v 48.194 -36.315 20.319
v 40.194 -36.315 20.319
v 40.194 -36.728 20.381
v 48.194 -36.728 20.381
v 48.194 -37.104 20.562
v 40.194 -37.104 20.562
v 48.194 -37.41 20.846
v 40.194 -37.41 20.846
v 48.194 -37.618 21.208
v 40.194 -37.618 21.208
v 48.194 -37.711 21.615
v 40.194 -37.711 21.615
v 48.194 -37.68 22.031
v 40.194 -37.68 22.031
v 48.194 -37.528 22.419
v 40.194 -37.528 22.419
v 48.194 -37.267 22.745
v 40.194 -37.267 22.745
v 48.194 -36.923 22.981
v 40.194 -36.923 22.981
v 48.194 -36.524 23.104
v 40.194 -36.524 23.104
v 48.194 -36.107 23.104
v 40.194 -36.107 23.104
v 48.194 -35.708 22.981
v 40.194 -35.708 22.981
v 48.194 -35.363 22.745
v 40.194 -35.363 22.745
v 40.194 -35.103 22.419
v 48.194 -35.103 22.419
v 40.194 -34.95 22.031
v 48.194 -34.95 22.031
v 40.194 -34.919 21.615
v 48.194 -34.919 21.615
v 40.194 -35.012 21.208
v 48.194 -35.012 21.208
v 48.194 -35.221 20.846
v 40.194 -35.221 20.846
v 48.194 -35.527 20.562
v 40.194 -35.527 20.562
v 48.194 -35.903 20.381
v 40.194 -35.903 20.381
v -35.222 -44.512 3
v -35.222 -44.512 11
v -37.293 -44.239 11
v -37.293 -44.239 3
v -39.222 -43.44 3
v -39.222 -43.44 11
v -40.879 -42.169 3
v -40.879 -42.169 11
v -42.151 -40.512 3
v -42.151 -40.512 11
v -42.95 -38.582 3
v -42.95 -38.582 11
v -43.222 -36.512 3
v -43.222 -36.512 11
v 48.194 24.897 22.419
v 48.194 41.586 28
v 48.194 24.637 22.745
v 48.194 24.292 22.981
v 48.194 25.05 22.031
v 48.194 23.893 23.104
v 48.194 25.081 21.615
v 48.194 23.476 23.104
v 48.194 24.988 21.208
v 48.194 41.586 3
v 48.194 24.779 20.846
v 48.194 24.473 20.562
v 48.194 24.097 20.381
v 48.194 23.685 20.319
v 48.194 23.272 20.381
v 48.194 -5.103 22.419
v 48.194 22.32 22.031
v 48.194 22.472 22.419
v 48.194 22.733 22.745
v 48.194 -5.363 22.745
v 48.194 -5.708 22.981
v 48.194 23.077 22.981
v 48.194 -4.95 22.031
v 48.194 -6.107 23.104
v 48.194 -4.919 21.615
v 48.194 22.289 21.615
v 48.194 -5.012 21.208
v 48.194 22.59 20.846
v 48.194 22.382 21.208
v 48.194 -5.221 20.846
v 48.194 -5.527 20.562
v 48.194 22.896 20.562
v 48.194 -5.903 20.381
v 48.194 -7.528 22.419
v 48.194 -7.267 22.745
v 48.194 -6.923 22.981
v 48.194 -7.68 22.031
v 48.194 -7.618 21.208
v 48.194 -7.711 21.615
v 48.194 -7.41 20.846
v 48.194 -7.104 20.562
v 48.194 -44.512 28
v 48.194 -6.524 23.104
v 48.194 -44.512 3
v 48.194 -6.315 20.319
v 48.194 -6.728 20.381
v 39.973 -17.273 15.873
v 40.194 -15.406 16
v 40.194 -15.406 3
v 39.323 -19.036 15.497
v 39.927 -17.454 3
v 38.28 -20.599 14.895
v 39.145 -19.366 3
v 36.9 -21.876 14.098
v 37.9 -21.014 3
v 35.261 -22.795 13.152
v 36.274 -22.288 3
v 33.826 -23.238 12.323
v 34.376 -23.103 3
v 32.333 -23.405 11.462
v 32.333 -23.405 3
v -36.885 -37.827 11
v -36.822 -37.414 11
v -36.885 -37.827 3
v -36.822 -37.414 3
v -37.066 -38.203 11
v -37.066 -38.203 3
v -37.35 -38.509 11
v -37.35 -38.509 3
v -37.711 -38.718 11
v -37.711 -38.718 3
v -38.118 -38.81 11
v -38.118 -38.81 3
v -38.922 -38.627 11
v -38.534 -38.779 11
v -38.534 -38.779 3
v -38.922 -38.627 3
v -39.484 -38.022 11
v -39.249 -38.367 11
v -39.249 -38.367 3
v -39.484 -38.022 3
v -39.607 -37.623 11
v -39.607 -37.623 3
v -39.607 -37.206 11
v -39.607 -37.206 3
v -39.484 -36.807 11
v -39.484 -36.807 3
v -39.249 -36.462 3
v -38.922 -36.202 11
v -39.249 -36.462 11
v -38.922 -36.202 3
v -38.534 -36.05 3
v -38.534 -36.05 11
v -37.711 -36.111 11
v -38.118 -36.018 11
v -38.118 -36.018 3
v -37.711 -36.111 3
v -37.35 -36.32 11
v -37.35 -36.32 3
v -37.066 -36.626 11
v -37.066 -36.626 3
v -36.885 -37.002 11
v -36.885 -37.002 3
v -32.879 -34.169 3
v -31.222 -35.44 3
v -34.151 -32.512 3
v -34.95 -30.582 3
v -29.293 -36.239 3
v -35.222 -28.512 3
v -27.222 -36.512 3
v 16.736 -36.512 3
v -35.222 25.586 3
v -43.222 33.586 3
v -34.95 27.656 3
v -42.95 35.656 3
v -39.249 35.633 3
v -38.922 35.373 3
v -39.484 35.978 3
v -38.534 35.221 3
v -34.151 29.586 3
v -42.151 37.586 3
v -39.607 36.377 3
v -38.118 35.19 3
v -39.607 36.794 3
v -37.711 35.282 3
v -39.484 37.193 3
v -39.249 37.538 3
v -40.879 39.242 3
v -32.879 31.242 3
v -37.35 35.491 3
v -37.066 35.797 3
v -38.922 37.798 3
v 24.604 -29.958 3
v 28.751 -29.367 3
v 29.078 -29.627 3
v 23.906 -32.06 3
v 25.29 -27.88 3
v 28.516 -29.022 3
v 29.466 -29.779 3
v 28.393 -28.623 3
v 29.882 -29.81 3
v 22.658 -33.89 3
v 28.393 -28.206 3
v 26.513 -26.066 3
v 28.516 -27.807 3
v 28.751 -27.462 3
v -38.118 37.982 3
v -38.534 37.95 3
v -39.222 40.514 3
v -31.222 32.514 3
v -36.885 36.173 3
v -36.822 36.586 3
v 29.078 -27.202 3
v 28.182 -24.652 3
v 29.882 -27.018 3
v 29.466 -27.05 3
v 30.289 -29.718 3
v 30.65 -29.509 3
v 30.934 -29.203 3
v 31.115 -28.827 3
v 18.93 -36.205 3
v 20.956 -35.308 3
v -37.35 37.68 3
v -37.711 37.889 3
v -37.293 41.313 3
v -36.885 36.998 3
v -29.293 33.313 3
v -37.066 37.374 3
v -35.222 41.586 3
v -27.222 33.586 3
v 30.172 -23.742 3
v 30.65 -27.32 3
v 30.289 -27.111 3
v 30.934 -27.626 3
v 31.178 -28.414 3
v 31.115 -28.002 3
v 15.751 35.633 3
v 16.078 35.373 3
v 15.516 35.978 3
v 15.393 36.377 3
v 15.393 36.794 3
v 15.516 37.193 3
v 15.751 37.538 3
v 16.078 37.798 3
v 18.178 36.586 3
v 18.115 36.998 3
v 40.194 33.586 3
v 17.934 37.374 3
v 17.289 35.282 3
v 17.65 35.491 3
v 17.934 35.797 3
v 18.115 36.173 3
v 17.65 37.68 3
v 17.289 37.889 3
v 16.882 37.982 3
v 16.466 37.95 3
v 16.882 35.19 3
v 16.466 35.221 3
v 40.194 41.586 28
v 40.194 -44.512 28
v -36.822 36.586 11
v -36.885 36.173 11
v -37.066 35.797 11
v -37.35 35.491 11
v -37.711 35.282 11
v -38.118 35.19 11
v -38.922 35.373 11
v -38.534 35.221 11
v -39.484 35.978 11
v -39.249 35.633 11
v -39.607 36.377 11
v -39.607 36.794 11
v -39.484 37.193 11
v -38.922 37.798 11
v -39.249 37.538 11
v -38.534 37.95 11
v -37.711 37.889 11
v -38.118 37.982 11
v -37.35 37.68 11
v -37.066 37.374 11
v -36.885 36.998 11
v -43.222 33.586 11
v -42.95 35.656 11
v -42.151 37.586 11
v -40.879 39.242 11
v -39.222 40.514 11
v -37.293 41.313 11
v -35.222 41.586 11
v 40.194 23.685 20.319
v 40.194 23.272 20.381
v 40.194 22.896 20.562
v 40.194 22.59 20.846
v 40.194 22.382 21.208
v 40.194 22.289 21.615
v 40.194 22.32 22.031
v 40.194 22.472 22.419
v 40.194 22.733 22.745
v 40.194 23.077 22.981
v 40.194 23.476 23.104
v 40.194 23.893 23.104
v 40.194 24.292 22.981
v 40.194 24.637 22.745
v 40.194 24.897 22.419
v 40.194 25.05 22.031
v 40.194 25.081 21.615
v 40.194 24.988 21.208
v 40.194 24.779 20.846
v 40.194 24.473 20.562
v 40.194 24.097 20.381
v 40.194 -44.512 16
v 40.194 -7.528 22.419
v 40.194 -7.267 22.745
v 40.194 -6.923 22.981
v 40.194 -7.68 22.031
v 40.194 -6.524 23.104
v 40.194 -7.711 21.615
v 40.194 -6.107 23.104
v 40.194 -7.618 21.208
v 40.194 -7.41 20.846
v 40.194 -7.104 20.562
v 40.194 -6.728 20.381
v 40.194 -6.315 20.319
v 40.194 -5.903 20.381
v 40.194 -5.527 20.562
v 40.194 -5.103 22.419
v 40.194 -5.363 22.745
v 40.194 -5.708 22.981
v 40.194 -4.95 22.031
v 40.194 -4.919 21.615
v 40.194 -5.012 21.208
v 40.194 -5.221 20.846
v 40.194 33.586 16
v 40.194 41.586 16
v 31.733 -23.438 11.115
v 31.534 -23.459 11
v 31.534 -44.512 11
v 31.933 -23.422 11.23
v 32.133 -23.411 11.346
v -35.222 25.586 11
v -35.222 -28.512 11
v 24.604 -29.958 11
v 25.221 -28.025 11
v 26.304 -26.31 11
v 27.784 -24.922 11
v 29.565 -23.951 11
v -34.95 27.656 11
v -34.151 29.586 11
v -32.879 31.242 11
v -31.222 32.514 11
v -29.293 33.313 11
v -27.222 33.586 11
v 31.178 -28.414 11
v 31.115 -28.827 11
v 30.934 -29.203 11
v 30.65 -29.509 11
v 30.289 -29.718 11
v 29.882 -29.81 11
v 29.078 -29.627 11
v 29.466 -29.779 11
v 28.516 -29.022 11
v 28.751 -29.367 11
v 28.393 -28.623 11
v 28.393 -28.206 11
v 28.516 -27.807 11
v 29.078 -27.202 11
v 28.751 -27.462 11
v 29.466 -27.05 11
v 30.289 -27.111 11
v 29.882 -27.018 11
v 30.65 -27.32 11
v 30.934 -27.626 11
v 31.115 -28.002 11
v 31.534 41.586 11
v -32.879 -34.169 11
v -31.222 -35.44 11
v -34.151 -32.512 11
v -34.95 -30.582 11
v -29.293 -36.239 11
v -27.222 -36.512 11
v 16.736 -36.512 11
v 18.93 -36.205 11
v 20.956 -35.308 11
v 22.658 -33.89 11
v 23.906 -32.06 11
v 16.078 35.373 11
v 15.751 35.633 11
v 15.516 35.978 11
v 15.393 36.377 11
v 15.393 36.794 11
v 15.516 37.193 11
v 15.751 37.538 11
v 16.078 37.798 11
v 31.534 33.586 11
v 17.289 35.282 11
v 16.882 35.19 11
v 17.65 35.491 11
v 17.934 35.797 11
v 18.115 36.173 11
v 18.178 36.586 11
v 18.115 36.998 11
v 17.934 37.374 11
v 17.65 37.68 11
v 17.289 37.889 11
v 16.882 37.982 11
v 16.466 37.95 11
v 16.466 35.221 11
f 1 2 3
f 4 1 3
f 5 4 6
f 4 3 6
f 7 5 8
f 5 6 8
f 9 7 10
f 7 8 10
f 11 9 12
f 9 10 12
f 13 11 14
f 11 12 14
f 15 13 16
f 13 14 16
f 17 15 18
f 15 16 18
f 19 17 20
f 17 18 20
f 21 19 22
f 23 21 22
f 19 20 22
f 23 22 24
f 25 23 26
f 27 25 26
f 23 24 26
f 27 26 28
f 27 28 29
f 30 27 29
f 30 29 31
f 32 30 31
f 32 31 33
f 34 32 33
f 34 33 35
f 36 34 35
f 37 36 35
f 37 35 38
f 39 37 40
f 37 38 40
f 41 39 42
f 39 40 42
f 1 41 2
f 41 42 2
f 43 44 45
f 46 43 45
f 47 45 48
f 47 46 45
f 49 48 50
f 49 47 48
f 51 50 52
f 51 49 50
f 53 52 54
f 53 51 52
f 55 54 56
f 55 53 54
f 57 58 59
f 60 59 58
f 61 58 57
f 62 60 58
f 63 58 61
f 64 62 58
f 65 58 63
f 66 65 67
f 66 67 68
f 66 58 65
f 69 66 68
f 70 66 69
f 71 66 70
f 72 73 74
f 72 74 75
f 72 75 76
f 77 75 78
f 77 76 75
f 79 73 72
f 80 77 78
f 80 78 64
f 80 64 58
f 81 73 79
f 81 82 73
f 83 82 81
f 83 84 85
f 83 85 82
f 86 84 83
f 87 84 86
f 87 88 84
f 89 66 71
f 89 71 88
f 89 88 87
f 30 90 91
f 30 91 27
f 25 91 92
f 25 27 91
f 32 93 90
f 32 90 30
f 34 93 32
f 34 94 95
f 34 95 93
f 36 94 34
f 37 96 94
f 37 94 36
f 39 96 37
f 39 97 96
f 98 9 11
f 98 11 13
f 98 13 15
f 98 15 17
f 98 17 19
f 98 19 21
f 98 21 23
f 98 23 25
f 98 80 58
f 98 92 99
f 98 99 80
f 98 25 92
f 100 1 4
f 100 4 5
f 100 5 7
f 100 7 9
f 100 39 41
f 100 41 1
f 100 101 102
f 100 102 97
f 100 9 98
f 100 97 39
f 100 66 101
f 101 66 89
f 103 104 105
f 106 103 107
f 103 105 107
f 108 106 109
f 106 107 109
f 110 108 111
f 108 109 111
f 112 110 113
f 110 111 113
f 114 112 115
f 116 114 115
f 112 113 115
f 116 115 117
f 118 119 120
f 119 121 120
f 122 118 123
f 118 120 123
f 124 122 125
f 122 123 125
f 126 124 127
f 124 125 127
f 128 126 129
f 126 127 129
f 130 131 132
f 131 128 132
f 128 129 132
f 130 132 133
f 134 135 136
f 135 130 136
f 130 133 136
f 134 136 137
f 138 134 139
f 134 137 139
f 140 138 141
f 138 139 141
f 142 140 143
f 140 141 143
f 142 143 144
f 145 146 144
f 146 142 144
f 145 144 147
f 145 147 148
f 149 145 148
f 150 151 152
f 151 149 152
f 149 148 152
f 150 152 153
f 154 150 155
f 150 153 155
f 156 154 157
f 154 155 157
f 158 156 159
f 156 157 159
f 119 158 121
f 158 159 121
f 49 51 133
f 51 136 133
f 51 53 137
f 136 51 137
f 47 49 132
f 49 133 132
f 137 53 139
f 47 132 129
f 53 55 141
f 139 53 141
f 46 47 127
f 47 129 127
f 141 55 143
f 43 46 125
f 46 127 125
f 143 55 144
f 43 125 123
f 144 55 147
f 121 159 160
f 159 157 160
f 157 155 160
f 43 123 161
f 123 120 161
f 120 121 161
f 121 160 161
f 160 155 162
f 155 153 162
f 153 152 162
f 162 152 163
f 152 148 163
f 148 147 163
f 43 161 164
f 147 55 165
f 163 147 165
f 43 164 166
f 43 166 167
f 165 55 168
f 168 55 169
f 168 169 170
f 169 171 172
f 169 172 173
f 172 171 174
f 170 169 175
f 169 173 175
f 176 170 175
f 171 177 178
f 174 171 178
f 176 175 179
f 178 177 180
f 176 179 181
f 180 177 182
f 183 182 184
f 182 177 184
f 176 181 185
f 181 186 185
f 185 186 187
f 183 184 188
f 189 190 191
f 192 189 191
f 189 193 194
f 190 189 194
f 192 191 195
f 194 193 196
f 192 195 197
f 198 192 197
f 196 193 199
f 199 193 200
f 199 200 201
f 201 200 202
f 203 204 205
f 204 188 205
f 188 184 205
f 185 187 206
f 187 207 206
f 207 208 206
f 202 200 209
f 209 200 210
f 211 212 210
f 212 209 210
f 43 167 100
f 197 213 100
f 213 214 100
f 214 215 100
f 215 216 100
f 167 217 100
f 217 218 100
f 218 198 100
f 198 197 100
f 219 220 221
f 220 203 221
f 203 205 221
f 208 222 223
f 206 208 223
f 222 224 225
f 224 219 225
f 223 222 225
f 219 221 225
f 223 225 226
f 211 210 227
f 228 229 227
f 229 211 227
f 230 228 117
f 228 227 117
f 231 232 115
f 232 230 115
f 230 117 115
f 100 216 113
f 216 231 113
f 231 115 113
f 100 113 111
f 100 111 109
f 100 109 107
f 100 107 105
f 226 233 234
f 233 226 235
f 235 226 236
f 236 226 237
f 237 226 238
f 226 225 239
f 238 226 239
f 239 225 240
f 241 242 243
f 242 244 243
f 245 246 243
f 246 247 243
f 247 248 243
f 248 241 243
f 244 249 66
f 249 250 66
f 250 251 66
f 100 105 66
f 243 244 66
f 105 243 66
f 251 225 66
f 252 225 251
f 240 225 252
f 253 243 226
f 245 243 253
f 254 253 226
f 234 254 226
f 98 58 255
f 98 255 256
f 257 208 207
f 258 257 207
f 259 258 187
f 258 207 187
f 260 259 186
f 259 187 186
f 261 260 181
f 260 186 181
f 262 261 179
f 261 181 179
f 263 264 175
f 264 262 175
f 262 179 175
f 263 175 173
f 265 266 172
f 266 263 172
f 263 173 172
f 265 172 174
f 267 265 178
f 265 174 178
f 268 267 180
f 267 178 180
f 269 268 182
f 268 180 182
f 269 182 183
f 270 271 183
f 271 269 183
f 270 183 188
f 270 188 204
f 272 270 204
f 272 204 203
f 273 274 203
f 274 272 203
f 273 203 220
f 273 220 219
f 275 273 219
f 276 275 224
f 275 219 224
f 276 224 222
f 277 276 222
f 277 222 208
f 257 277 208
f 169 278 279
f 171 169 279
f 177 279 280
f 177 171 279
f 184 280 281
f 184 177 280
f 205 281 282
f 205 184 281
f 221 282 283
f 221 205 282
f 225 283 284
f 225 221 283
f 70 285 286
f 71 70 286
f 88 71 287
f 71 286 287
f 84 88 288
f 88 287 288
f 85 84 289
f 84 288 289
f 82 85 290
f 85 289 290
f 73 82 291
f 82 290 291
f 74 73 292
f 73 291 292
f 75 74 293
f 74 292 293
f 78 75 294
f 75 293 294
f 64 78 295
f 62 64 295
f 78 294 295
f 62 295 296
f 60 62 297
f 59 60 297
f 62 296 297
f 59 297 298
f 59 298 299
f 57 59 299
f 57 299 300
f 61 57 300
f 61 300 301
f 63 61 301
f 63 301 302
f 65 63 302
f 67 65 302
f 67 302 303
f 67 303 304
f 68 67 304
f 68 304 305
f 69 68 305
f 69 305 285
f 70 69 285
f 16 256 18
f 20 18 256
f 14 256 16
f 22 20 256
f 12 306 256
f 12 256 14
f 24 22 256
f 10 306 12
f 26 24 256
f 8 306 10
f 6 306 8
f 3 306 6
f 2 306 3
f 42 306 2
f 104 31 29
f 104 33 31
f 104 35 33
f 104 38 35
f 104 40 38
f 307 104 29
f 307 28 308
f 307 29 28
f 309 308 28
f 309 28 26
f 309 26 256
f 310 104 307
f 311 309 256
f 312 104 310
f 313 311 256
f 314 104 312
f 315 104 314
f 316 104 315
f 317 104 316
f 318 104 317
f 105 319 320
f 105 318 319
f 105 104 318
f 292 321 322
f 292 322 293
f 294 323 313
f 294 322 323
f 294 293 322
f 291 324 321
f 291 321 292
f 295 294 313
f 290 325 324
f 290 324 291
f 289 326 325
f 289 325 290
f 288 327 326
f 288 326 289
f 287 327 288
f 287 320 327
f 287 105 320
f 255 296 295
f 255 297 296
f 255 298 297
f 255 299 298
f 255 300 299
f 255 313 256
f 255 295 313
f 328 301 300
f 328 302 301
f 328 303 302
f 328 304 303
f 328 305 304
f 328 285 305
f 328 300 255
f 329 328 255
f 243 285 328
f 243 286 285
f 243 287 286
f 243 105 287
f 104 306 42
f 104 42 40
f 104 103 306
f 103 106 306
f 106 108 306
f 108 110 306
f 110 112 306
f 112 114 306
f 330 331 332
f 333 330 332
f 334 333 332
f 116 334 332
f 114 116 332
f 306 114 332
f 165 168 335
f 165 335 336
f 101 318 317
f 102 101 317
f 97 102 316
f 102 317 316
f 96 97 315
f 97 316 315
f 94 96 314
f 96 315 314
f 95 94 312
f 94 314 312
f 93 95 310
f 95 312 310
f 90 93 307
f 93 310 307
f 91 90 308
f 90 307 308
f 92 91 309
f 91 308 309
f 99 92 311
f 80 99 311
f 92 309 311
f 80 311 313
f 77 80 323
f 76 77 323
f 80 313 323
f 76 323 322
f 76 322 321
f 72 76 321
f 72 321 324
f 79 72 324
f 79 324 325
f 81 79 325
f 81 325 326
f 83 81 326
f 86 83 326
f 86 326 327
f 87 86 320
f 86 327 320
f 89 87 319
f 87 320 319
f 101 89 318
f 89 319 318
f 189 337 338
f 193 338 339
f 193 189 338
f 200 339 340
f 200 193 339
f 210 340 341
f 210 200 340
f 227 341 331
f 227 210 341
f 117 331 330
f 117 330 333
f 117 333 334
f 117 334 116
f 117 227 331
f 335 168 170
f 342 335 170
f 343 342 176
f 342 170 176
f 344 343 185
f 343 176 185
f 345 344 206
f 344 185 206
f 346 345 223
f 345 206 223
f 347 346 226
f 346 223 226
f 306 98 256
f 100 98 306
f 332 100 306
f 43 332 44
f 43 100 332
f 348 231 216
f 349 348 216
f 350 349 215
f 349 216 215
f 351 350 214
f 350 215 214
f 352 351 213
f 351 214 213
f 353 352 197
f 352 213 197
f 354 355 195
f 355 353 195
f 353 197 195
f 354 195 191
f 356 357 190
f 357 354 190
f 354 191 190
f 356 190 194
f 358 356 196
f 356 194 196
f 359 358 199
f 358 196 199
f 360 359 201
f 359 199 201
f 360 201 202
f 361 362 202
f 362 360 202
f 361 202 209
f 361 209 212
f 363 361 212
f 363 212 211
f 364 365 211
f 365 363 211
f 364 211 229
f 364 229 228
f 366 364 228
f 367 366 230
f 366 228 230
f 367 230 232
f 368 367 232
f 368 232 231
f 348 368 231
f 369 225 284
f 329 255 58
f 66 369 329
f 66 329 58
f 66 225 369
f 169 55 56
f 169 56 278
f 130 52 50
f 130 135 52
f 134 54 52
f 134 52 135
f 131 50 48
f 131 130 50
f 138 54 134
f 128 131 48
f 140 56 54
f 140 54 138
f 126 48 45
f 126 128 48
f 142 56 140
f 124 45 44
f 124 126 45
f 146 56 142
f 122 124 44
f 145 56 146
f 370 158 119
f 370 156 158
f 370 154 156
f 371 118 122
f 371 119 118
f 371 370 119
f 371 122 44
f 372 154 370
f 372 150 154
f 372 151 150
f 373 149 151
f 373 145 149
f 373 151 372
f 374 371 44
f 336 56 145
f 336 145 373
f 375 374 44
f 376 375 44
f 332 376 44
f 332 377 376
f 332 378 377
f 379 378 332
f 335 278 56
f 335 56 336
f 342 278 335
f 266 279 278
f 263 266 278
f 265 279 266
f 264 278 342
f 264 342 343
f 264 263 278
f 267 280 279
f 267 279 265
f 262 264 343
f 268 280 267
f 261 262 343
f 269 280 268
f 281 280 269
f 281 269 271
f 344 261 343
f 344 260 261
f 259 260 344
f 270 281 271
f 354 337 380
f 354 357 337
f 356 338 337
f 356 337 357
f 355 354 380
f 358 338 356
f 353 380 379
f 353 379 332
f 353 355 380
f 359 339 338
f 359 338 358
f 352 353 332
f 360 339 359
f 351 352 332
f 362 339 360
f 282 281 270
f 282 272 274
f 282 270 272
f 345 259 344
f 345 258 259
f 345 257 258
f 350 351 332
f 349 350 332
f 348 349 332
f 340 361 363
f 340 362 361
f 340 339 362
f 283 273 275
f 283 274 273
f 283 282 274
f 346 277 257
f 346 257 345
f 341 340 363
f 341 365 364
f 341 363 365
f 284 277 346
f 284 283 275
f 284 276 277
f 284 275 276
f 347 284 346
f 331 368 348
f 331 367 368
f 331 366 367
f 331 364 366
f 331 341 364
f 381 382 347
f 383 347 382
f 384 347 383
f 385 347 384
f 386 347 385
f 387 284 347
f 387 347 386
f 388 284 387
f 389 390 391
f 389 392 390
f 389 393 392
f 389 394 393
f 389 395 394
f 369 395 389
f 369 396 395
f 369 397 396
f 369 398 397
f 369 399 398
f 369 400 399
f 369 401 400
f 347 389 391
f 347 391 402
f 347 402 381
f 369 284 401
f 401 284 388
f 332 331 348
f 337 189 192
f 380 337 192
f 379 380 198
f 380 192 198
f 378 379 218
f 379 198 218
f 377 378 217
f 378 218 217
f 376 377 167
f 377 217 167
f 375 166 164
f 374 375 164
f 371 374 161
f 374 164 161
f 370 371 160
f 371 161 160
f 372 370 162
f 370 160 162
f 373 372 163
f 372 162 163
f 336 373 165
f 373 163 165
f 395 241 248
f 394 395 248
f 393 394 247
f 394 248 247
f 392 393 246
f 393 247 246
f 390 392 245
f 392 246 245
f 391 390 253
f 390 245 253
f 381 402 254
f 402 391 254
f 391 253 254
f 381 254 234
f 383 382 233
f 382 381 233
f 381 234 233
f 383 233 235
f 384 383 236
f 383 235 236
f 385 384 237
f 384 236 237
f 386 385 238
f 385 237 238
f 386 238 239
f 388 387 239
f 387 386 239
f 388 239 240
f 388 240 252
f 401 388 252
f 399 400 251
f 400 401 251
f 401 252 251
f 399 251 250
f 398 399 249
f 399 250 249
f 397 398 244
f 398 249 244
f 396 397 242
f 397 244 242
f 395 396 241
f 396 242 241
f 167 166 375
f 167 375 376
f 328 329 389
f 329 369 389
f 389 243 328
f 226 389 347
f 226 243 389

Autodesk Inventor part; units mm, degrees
ref_plane "YZ Plane" through (0, 0, 0) normal (1, 0, 0) x (0, 1, 0)
ref_plane "XZ Plane" through (0, 0, 0) normal (0, 1, 0) x (-1, 0, 0)
ref_plane "XY Plane" through (0, 0, 0) normal (0, 0, 1) x (1, 0, 0)
ref_plane "Arbeitsebene1" through (0, 0, 3) normal (0, 0, 1) x (1, 0, 0)
sketch "Skizze1" plane through (0, 0, 3) normal (0, 0, 1) x (1, 0, 0)
  line L0 (43.1941, -41.5994) -> (-43.1659, -41.5994) construction
  line L1 (43.1941, 41.5856) -> (43.1941, -41.5994) construction
  line L2 (-43.2224, 41.5856) -> (43.1941, 41.5856) construction
  line L3 (-43.1659, -41.5994) -> (-43.2224, 41.5856) construction
  circle A0 centre (37.6276, -35.8844) radius 0.5 construction
  circle A1 centre (35.0876, -35.8844) radius 0.5 construction
  circle A2 centre (32.5476, -35.8844) radius 0.5 construction
  circle A3 centre (36.8476, -29.7044) radius 0.5 construction
  circle A4 centre (25.8376, -35.8644) radius 0.5 construction
  circle A5 centre (23.2976, -35.8644) radius 0.5 construction
  circle A6 centre (20.7576, -35.8644) radius 0.5 construction
  circle A7 centre (36.8476, -27.1644) radius 0.5 construction
  circle A8 centre (36.8476, -24.6244) radius 0.5 construction
  circle A9 centre (29.7776, -28.4144) radius 1.6 construction
  circle A10 centre (36.8976, -19.8144) radius 0.5 construction
  circle A11 centre (29.8161, -22.9044) radius 0.5 construction
  circle A12 centre (27.2761, -22.9044) radius 0.5 construction
  circle A13 centre (24.7361, -22.9044) radius 0.5 construction
  circle A14 centre (22.1961, -22.9044) radius 0.5 construction
  circle A15 centre (19.6561, -22.9044) radius 0.5 construction
  circle A16 centre (13.8076, -35.7944) radius 0.5 construction
  circle A17 centre (11.2676, -35.7944) radius 0.5 construction
  circle A18 centre (8.7276, -35.7944) radius 0.5 construction
  circle A19 centre (1.7376, -35.7544) radius 0.5 construction
  circle A20 centre (-0.8024, -35.7544) radius 0.5 construction
  circle A21 centre (18.2361, -29.1444) radius 0.5 construction
  circle A22 centre (18.2361, -26.6044) radius 0.5 construction
  circle A23 centre (10.7361, -29.1444) radius 0.5 construction
  circle A24 centre (10.7361, -26.6044) radius 0.5 construction
  circle A25 centre (17.1161, -22.9044) radius 0.5 construction
  circle A26 centre (14.5761, -22.9044) radius 0.5 construction
  circle A27 centre (12.0361, -22.9044) radius 0.5 construction
  circle A28 centre (9.4961, -22.9044) radius 0.5 construction
  circle A29 centre (3.2361, -29.1444) radius 0.5 construction
  circle A30 centre (3.2361, -26.6044) radius 0.5 construction
  circle A31 centre (6.9561, -22.9044) radius 0.5 construction
  circle A32 centre (1.1961, -20.0044) radius 0.5 construction
  circle A33 centre (36.8976, -17.2744) radius 0.5 construction
  circle A34 centre (36.8976, -14.7344) radius 0.5 construction
  circle A35 centre (36.9476, -8.9644) radius 0.5 construction
  circle A36 centre (36.9476, -6.4244) radius 0.5 construction
  circle A37 centre (30.7111, -6.3544) radius 0.5 construction
  circle A38 centre (36.9476, -3.8844) radius 0.5 construction
  circle A39 centre (30.7111, -3.8144) radius 0.5 construction
  circle A40 centre (30.7111, -1.2744) radius 0.5 construction
  circle A41 centre (5.3111, -6.3544) radius 0.5 construction
  circle A42 centre (5.3111, -3.8144) radius 0.5 construction
  circle A43 centre (5.3111, -1.2744) radius 0.5 construction
  circle A44 centre (-3.3424, -35.7544) radius 0.5 construction
  circle A45 centre (-8.1789, -38.8044) radius 0.5 construction
  circle A46 centre (-8.1789, -35.1044) radius 0.5 construction
  circle A47 centre (-8.1789, -31.4044) radius 0.5 construction
  circle A48 centre (-10.7189, -38.8044) radius 0.5 construction
  circle A49 centre (-10.7189, -35.1044) radius 0.5 construction
  circle A50 centre (-14.5659, -33.6344) radius 0.5 construction
  circle A51 centre (-10.7189, -31.4044) radius 0.5 construction
  circle A52 centre (-17.1059, -33.6344) radius 0.5 construction
  circle A53 centre (-19.6459, -33.6344) radius 0.5 construction
  circle A54 centre (-1.3439, -27.2044) radius 0.5 construction
  circle A55 centre (-3.8839, -27.2044) radius 0.5 construction
  circle A56 centre (-6.4239, -27.2044) radius 0.5 construction
  circle A57 centre (-8.9639, -27.2044) radius 0.5 construction
  circle A58 centre (-1.3439, -23.6044) radius 0.5 construction
  circle A59 centre (-3.8839, -23.6044) radius 0.5 construction
  circle A60 centre (-1.3439, -20.0044) radius 0.5 construction
  circle A61 centre (-3.8839, -20.0044) radius 0.5 construction
  circle A62 centre (-6.4239, -23.6044) radius 0.5 construction
  circle A63 centre (-8.9639, -23.6044) radius 0.5 construction
  circle A64 centre (-6.4239, -20.0044) radius 0.5 construction
  circle A65 centre (-8.9639, -20.0044) radius 0.5 construction
  circle A66 centre (-14.5659, -20.9344) radius 0.5 construction
  circle A67 centre (-17.1059, -20.9344) radius 0.5 construction
  circle A68 centre (-19.6459, -20.9344) radius 0.5 construction
  circle A69 centre (-22.1859, -33.6344) radius 0.5 construction
  circle A70 centre (-24.7259, -33.6344) radius 0.5 construction
  circle A71 centre (-27.2659, -33.6344) radius 0.5 construction
  circle A72 centre (-29.8059, -33.6344) radius 0.5 construction
  circle A73 centre (-38.2224, -37.4144) radius 1.6 construction
  circle A74 centre (-32.3459, -33.6344) radius 0.5 construction
  circle A75 centre (-38.3399, -30.1694) radius 0.5 construction
  circle A76 centre (-22.1859, -20.9344) radius 0.5 construction
  circle A77 centre (-24.7259, -20.9344) radius 0.5 construction
  circle A78 centre (-27.2659, -20.9344) radius 0.5 construction
  circle A79 centre (-29.8059, -20.9344) radius 0.5 construction
  circle A80 centre (-38.3399, -27.6294) radius 0.5 construction
  circle A81 centre (-38.3399, -25.0894) radius 0.5 construction
  circle A82 centre (-32.3459, -20.9344) radius 0.5 construction
  circle A83 centre (-38.3399, -22.5494) radius 0.5 construction
  circle A84 centre (-2.2639, -15.2044) radius 0.375 construction
  circle A85 centre (-4.2639, -15.2044) radius 0.375 construction
  circle A86 centre (-6.2639, -15.2044) radius 0.375 construction
  circle A87 centre (-8.2639, -15.2044) radius 0.375 construction
  circle A88 centre (-2.2639, -9.7044) radius 0.375 construction
  circle A89 centre (-4.2639, -9.7044) radius 0.375 construction
  circle A90 centre (-6.2639, -9.7044) radius 0.375 construction
  circle A91 centre (-8.2639, -9.7044) radius 0.375 construction
  circle A92 centre (-14.5659, -15.6344) radius 0.5 construction
  circle A93 centre (-17.1059, -15.6344) radius 0.5 construction
  circle A94 centre (-19.6459, -15.6344) radius 0.5 construction
  circle A95 centre (-2.2639, -4.2044) radius 0.375 construction
  circle A96 centre (-4.2639, -4.2044) radius 0.375 construction
  circle A97 centre (-6.2639, -4.2044) radius 0.375 construction
  circle A98 centre (-8.2639, -4.2044) radius 0.375 construction
  circle A99 centre (-14.5659, -2.9344) radius 0.5 construction
  circle A100 centre (-17.1059, -2.9344) radius 0.5 construction
  circle A101 centre (-19.6459, -2.9344) radius 0.5 construction
  circle A102 centre (-22.1859, -15.6344) radius 0.5 construction
  circle A103 centre (-24.7259, -15.6344) radius 0.5 construction
  circle A104 centre (-27.2659, -15.6344) radius 0.5 construction
  circle A105 centre (-29.8059, -15.6344) radius 0.5 construction
  circle A106 centre (-32.3459, -15.6344) radius 0.5 construction
  circle A107 centre (-38.4669, -13.2784) radius 0.5 construction
  circle A108 centre (-38.4669, -10.7384) radius 0.5 construction
  circle A109 centre (-22.1859, -2.9344) radius 0.5 construction
  circle A110 centre (-24.7259, -2.9344) radius 0.5 construction
  circle A111 centre (-27.2659, -2.9344) radius 0.5 construction
  circle A112 centre (-29.8059, -2.9344) radius 0.5 construction
  circle A113 centre (-38.4669, -8.1984) radius 0.5 construction
  circle A114 centre (-38.4669, -5.6584) radius 0.5 construction
  circle A115 centre (-32.3459, -2.9344) radius 0.5 construction
  circle A116 centre (36.9476, 0.6556) radius 0.5 construction
  circle A117 centre (36.9476, 3.1956) radius 0.5 construction
  circle A118 centre (30.7111, 1.2656) radius 0.5 construction
  circle A119 centre (30.7111, 3.8056) radius 0.5 construction
  circle A120 centre (36.9476, 5.7356) radius 0.5 construction
  circle A121 centre (30.7111, 6.3456) radius 0.5 construction
  circle A122 centre (30.7111, 8.8856) radius 0.5 construction
  circle A123 centre (36.9976, 10.7656) radius 0.5 construction
  circle A124 centre (36.9976, 13.3056) radius 0.5 construction
  circle A125 centre (30.7111, 11.4256) radius 0.5 construction
  circle A126 centre (30.7111, 13.9656) radius 0.5 construction
  circle A127 centre (36.9976, 15.8456) radius 0.5 construction
  circle A128 centre (30.7111, 16.5056) radius 0.5 construction
  circle A129 centre (30.7111, 19.0456) radius 0.5 construction
  circle A130 centre (5.3111, 1.2656) radius 0.5 construction
  circle A131 centre (5.3111, 3.8056) radius 0.5 construction
  circle A132 centre (5.3111, 6.3456) radius 0.5 construction
  circle A133 centre (5.3111, 8.8856) radius 0.5 construction
  circle A134 centre (5.3111, 11.4256) radius 0.5 construction
  circle A135 centre (5.3111, 13.9656) radius 0.5 construction
  circle A136 centre (5.3111, 16.5056) radius 0.5 construction
  circle A137 centre (5.3111, 19.0456) radius 0.5 construction
  circle A138 centre (36.9476, 20.9456) radius 0.5 construction
  circle A139 centre (36.9476, 23.4856) radius 0.5 construction
  circle A140 centre (30.7111, 21.5856) radius 0.5 construction
  circle A141 centre (30.7111, 24.1256) radius 0.5 construction
  circle A142 centre (36.9476, 26.0256) radius 0.5 construction
  circle A143 centre (30.7111, 26.6656) radius 0.5 construction
  circle A144 centre (30.7111, 29.2056) radius 0.5 construction
  circle A145 centre (30.7111, 31.7456) radius 0.5 construction
  circle A146 centre (30.7111, 34.2856) radius 0.5 construction
  circle A147 centre (30.7111, 36.8256) radius 0.5 construction
  circle A148 centre (30.7111, 39.3656) radius 0.5 construction
  circle A149 centre (5.3111, 21.5856) radius 0.5 construction
  circle A150 centre (5.3111, 24.1256) radius 0.5 construction
  circle A151 centre (5.3111, 26.6656) radius 0.5 construction
  circle A152 centre (5.3111, 29.2056) radius 0.5 construction
  circle A153 centre (16.7776, 36.5856) radius 1.6 construction
  circle A154 centre (5.3111, 31.7456) radius 0.5 construction
  circle A155 centre (5.3111, 34.2856) radius 0.5 construction
  circle A156 centre (5.3111, 36.8256) radius 0.5 construction
  circle A157 centre (5.3111, 39.3656) radius 0.5 construction
  circle A158 centre (-14.5659, 2.3656) radius 0.5 construction
  circle A159 centre (-17.1059, 2.3656) radius 0.5 construction
  circle A160 centre (-19.6459, 2.3656) radius 0.5 construction
  circle A161 centre (-14.5659, 15.0656) radius 0.5 construction
  circle A162 centre (-17.1059, 15.0656) radius 0.5 construction
  circle A163 centre (-19.6459, 15.0656) radius 0.5 construction
  circle A164 centre (-14.5659, 20.0656) radius 0.5 construction
  circle A165 centre (-17.1059, 20.0656) radius 0.5 construction
  circle A166 centre (-19.6459, 20.0656) radius 0.5 construction
  circle A167 centre (-22.1859, 2.3656) radius 0.5 construction
  circle A168 centre (-24.7259, 2.3656) radius 0.5 construction
  circle A169 centre (-27.2659, 2.3656) radius 0.5 construction
  circle A170 centre (-29.8059, 2.3656) radius 0.5 construction
  circle A171 centre (-32.3459, 2.3656) radius 0.5 construction
  circle A172 centre (-38.4669, 4.8826) radius 0.5 construction
  circle A173 centre (-38.4669, 7.4226) radius 0.5 construction
  circle A174 centre (-38.4669, 9.9626) radius 0.5 construction
  circle A175 centre (-22.1859, 15.0656) radius 0.5 construction
  circle A176 centre (-24.7259, 15.0656) radius 0.5 construction
  circle A177 centre (-27.2659, 15.0656) radius 0.5 construction
  circle A178 centre (-29.8059, 15.0656) radius 0.5 construction
  circle A179 centre (-22.1859, 20.0656) radius 0.5 construction
  circle A180 centre (-24.7259, 20.0656) radius 0.5 construction
  circle A181 centre (-27.2659, 20.0656) radius 0.5 construction
  circle A182 centre (-29.8059, 20.0656) radius 0.5 construction
  circle A183 centre (-32.3459, 15.0656) radius 0.5 construction
  circle A184 centre (-38.4669, 12.5026) radius 0.5 construction
  circle A185 centre (-32.3459, 20.0656) radius 0.5 construction
  line L4 (-0.223, 29.8753) -> (-0.0936, 29.8162) construction
  line L5 (-0.0936, 29.8162) -> (0.014, 29.723) construction
  line L6 (0.014, 29.723) -> (0.0909, 29.6033) construction
  line L7 (0.0909, 29.6033) -> (0.131, 29.4667) construction
  line L8 (0.131, 29.4667) -> (0.131, 29.3244) construction
  line L9 (0.131, 29.3244) -> (0.0909, 29.1879) construction
  line L10 (0.0909, 29.1879) -> (0.014, 29.0681) construction
  line L11 (0.014, 29.0681) -> (-0.0936, 28.9749) construction
  line L12 (-0.0936, 28.9749) -> (-0.223, 28.9158) construction
  line L13 (-0.223, 28.9158) -> (-0.3639, 28.8956) construction
  line L14 (-0.3639, 28.8956) -> (-2.9639, 28.8956) construction
  line L15 (-2.9639, 28.8956) -> (-3.1047, 28.9158) construction
  line L16 (-3.1047, 28.9158) -> (-3.2342, 28.9749) construction
  line L17 (-3.2342, 28.9749) -> (-3.3417, 29.0681) construction
  line L18 (-3.3417, 29.0681) -> (-3.4187, 29.1879) construction
  line L19 (-3.4187, 29.1879) -> (-3.4588, 29.3244) construction
  line L20 (-3.4588, 29.3244) -> (-3.4588, 29.4667) construction
  line L21 (-3.4588, 29.4667) -> (-3.4187, 29.6033) construction
  line L22 (-3.4187, 29.6033) -> (-3.3417, 29.723) construction
  line L23 (-3.3417, 29.723) -> (-3.2342, 29.8162) construction
  line L24 (-3.2342, 29.8162) -> (-3.1047, 29.8753) construction
  line L25 (-3.1047, 29.8753) -> (-2.9639, 29.8956) construction
  line L26 (-2.9639, 29.8956) -> (-0.3639, 29.8956) construction
  line L27 (-0.3639, 29.8956) -> (-0.223, 29.8753) construction
  line L28 (-6.9436, 33.5364) -> (-6.8845, 33.6659) construction
  line L29 (-6.8845, 33.6659) -> (-6.7913, 33.7734) construction
  line L30 (-6.7913, 33.7734) -> (-6.6716, 33.8504) construction
  line L31 (-6.6716, 33.8504) -> (-6.535, 33.8905) construction
  line L32 (-6.535, 33.8905) -> (-6.3927, 33.8905) construction
  line L33 (-6.3927, 33.8905) -> (-6.2562, 33.8504) construction
  line L34 (-6.2562, 33.8504) -> (-6.1364, 33.7734) construction
  line L35 (-6.1364, 33.7734) -> (-6.0432, 33.6659) construction
  line L36 (-6.0432, 33.6659) -> (-5.9841, 33.5364) construction
  line L37 (-5.9841, 33.5364) -> (-5.9639, 33.3956) construction
  line L38 (-5.9639, 33.3956) -> (-5.9639, 31.1956) construction
  line L39 (-5.9639, 31.1956) -> (-5.9841, 31.0547) construction
  line L40 (-5.9841, 31.0547) -> (-6.0432, 30.9253) construction
  line L41 (-6.0432, 30.9253) -> (-6.1364, 30.8177) construction
  line L42 (-6.1364, 30.8177) -> (-6.2562, 30.7408) construction
  line L43 (-6.2562, 30.7408) -> (-6.3927, 30.7007) construction
  line L44 (-6.3927, 30.7007) -> (-6.535, 30.7007) construction
  line L45 (-6.535, 30.7007) -> (-6.6716, 30.7408) construction
  line L46 (-6.6716, 30.7408) -> (-6.7913, 30.8177) construction
  line L47 (-6.7913, 30.8177) -> (-6.8845, 30.9253) construction
  line L48 (-6.8845, 30.9253) -> (-6.9436, 31.0547) construction
  line L49 (-6.9436, 31.0547) -> (-6.9639, 31.1956) construction
  line L50 (-6.9639, 31.1956) -> (-6.9639, 33.3956) construction
  line L51 (-6.9639, 33.3956) -> (-6.9436, 33.5364) construction
  line L52 (-0.423, 36.1753) -> (-0.2936, 36.1162) construction
  line L53 (-0.2936, 36.1162) -> (-0.186, 36.023) construction
  line L54 (-0.186, 36.023) -> (-0.1091, 35.9033) construction
  line L55 (-0.1091, 35.9033) -> (-0.069, 35.7667) construction
  line L56 (-0.069, 35.7667) -> (-0.069, 35.6244) construction
  line L57 (-0.069, 35.6244) -> (-0.1091, 35.4879) construction
  line L58 (-0.1091, 35.4879) -> (-0.186, 35.3681) construction
  line L59 (-0.186, 35.3681) -> (-0.2936, 35.2749) construction
  line L60 (-0.2936, 35.2749) -> (-0.423, 35.2158) construction
  line L61 (-0.423, 35.2158) -> (-0.5639, 35.1956) construction
  line L62 (-0.5639, 35.1956) -> (-2.7639, 35.1956) construction
  line L63 (-2.7639, 35.1956) -> (-2.9047, 35.2158) construction
  line L64 (-2.9047, 35.2158) -> (-3.0342, 35.2749) construction
  line L65 (-3.0342, 35.2749) -> (-3.1417, 35.3681) construction
  line L66 (-3.1417, 35.3681) -> (-3.2187, 35.4879) construction
  line L67 (-3.2187, 35.4879) -> (-3.2588, 35.6244) construction
  line L68 (-3.2588, 35.6244) -> (-3.2588, 35.7667) construction
  line L69 (-3.2588, 35.7667) -> (-3.2187, 35.9033) construction
  line L70 (-3.2187, 35.9033) -> (-3.1417, 36.023) construction
  line L71 (-3.1417, 36.023) -> (-3.0342, 36.1162) construction
  line L72 (-3.0342, 36.1162) -> (-2.9047, 36.1753) construction
  line L73 (-2.9047, 36.1753) -> (-2.7639, 36.1956) construction
  line L74 (-2.7639, 36.1956) -> (-0.5639, 36.1956) construction
  line L75 (-0.5639, 36.1956) -> (-0.423, 36.1753) construction
  circle A186 centre (-14.5659, 32.7656) radius 0.5 construction
  circle A187 centre (-17.1059, 32.7656) radius 0.5 construction
  circle A188 centre (-19.6459, 32.7656) radius 0.5 construction
  circle A189 centre (-38.4669, 22.1546) radius 0.5 construction
  circle A190 centre (-38.4669, 24.6946) radius 0.5 construction
  circle A191 centre (-38.4669, 27.2346) radius 0.5 construction
  circle A192 centre (-38.4669, 29.7746) radius 0.5 construction
  circle A193 centre (-22.1859, 32.7656) radius 0.5 construction
  circle A194 centre (-24.7259, 32.7656) radius 0.5 construction
  circle A195 centre (-27.2659, 32.7656) radius 0.5 construction
  circle A196 centre (-29.8059, 32.7656) radius 0.5 construction
  circle A197 centre (-32.3459, 32.7656) radius 0.5 construction
  circle A198 centre (-38.2224, 36.5856) radius 1.6 construction
  line L76 (48.1941, 113.9931) -> (48.1941, -93.0069) projected
  line L77 (-43.2224, 41.5856) -> (48.1941, 41.5856)
  line L78 (48.1941, 41.5856) -> (48.1941, -44.5117)
  line L79 (48.1941, -44.5117) -> (-43.2224, -44.5117)
  line L80 (-43.2224, -44.5117) -> (-43.2224, 41.5856)
  line L81 (-35.2224, -36.5117) -> (40.1941, -36.5117)
  line L82 (40.1941, -36.5117) -> (40.1941, 33.5856)
  line L83 (40.1941, 33.5856) -> (-35.2224, 33.5856)
  line L84 (-35.2224, 33.5856) -> (-35.2224, -36.5117)
  line L85 (24.7361, -36.5117) -> (40.1941, -36.5117)
  line L86 (40.1941, -36.5117) -> (40.1941, -23.4063)
  line L87 (40.1941, -23.4063) -> (24.7361, -23.4063)
  line L88 (24.7361, -23.4063) -> (24.7361, -36.5117)
  circle A199 centre (-38.2224, -37.4144) radius 1.4
  circle A200 centre (29.7776, -28.4144) radius 1.4
  circle A201 centre (16.7776, 36.5856) radius 1.4
  circle A202 centre (-38.2224, 36.5856) radius 1.4
  point P0 (0, 0)
  point P1 (48.1941, 41.5856)
  dimension "d0" = 8
  dimension "d1" = 2.8
  dimension "d2" = 2.8
  dimension "d3" = 2.8
  dimension "d4" = 2.8
extrude "Extrusion1" add sketch "Skizze1" along normal blind 8 contours L76 L79 L80 L77 | L88 L87 L82 L81
sketch "Skizze2" plane through (48.1941, -44.5117, 3) normal (1, 0, 0) x (0, 0, -1)
  line L0 (0, 86.0973) -> (-8, 86.0973) projected
  line L1 (0, 0) -> (-8, 0) projected
  line L2 (-41.7258, 75.9615) -> (-41.7258, 34.048) projected
  line L3 (-41.7258, 34.048) -> (-71.8357, 34.048) projected
  line L4 (-71.8357, 34.048) -> (-71.8357, 75.9615) projected
  line L5 (-71.8357, 75.9615) -> (-41.7258, 75.9615) projected
  circle A0 centre (-115.652, -48.4952) radius 1.4 projected
  line L6 (-115.652, 173.3302) -> (33.348, 173.3302) projected
  arc A1 (-115.652, 173.3302) -> (-130.4774, 158.5048) centre (-115.652, 158.5048) ccw projected
  line L7 (-130.4774, -48.4952) -> (-130.4774, 158.5048) projected
  arc A2 (-130.4774, -48.4952) -> (-115.652, -63.3207) centre (-115.652, -48.4952) ccw projected
  line L8 (33.348, -63.3207) -> (-115.652, -63.3207) projected
  arc A3 (33.348, -63.3207) -> (48.1735, -48.4952) centre (33.348, -48.4952) ccw projected
  line L9 (48.1735, -40.6698) -> (48.1735, -48.4952) projected
  line L10 (41.848, -40.6698) -> (48.1735, -40.6698) projected
  arc A4 (26.6735, -25.4952) -> (41.848, -40.6698) centre (41.848, -25.4952) ccw projected
  line L11 (26.6735, -16.0952) -> (26.6735, -25.4952) projected
  arc A5 (41.848, -0.9207) -> (26.6735, -16.0952) centre (41.848, -16.0952) ccw projected
  line L12 (48.1735, -0.9207) -> (41.848, -0.9207) projected
  line L13 (48.1735, 158.5048) -> (48.1735, -0.9207) projected
  arc A6 (48.1735, 158.5048) -> (33.348, 173.3302) centre (33.348, 158.5048) ccw projected
  line L14 (-8, 0) -> (-8, 86.0973) projected
  line L15 (-8, 86.0973) -> (-25, 86.0973)
  line L16 (-25, 86.0973) -> (-25, 0)
  line L17 (-25, 0) -> (-8, 0)
  line L18 (-8, 0) -> (-8, 86.0973)
  line L19 (-91.152, -21.4995) -> (8.848, -21.4995) projected
  arc A7 (8.848, -41.4995) -> (8.848, -21.4995) centre (8.848, -31.4995) ccw projected
  line L20 (8.848, -41.4995) -> (-91.152, -41.4995) projected
  arc A8 (-91.152, -21.4995) -> (-91.152, -41.4995) centre (-91.152, -31.4995) ccw projected
  line L21 (-91.152, 150.8178) -> (8.848, 150.8178) projected
  arc A9 (8.848, 130.8178) -> (8.848, 150.8178) centre (8.848, 140.8178) ccw projected
  line L22 (-20.6404, 130.8178) -> (-91.152, 130.8178) projected
  arc A10 (-91.152, 150.8178) -> (-91.152, 130.8178) centre (-91.152, 140.8178) ccw projected
  arc A11 (-20.6404, 130.8178) -> (-16.798, 130.8178) centre (-18.7192, 128.1964) ccw projected
  line L23 (8.848, 130.8178) -> (-16.798, 130.8178) projected
  circle A12 centre (-69.852, 157.3428) radius 3.25 projected
  arc A13 (-21.4197, 100.0048) -> (-16.0187, 100.0048) centre (-18.7192, 98.1964) ccw projected
  arc A14 (-16.0187, 100.0048) -> (-21.4197, 100.0048) centre (-18.7192, 101.8131) ccw projected
  arc A15 (-21.4197, 70.0048) -> (-16.0187, 70.0048) centre (-18.7192, 68.1964) ccw projected
  arc A16 (-16.0187, 70.0048) -> (-21.4197, 70.0048) centre (-18.7192, 71.8131) ccw projected
  arc A17 (-21.4197, 40.0048) -> (-16.0187, 40.0048) centre (-18.7192, 38.1964) ccw projected
  arc A18 (-16.0187, 40.0048) -> (-21.4197, 40.0048) centre (-18.7192, 41.8131) ccw projected
  arc A19 (-21.4197, 10.0048) -> (-16.0187, 10.0048) centre (-18.7192, 8.1964) ccw projected
  arc A20 (-16.0187, 10.0048) -> (-21.4197, 10.0048) centre (-18.7192, 11.8131) ccw projected
  circle A21 centre (-54.852, 157.3428) radius 3.25 projected
  circle A22 centre (-39.852, 157.3428) radius 3.25 projected
  circle A23 centre (-33.552, -2.4952) radius 3.25 projected
  circle A24 centre (-48.3, -2.4952) radius 3.25 projected
  circle A25 centre (-61.4039, -2.4952) radius 3.25 projected
  circle A26 centre (-76.152, -2.4952) radius 3.25 projected
  circle A27 centre (-18.7192, -18.1869) radius 3.25 projected
  circle A28 centre (33.348, -48.4952) radius 3.25 projected
  circle A29 centre (-39.852, -47.3333) radius 3.25 projected
  circle A30 centre (-54.852, -47.3333) radius 3.25 projected
  circle A31 centre (-69.852, -47.3333) radius 3.25 projected
  circle A32 centre (33.348, 158.5048) radius 3.25 projected
  circle A33 centre (-115.652, 158.5048) radius 3.25 projected
  circle A34 centre (-32, 113.5048) radius 3.25 projected
  circle A35 centre (-49.852, 113.5048) radius 3.25 projected
  circle A36 centre (-59.852, 113.5048) radius 3.25 projected
  circle A37 centre (-77.7039, 113.5048) radius 3.25 projected
  circle A38 centre (-120.652, 163.5048) radius 1.4 projected
  circle A39 centre (38.348, 163.5048) radius 1.4 projected
  circle A40 centre (-120.652, -53.4952) radius 1.4 projected
  circle A41 centre (38.348, -53.4952) radius 1.4 projected
  point P0 (3, 44.5117)
  dimension "d7" = 17
extrude "Extrusion2" add sketch "Skizze2" against normal up to surface (8 mm away) contours L17 L16 L15 L14 | A16 A15 | A18 A17 | A20 A19
chamfer "Fasen1" distance 5 angle 60 2 edges at (40.1941, 37.5856, 11) (40.1941, -33.959, 11) measured on face at (40.1941, -8.7775, 22.3333)
fillet "Rundung1" radius 8 8 edges at (-43.2224, 41.5856, 7) (-43.2224, -44.5117, 7) (-35.2224, -36.5117, 7) (-35.2224, 33.5856, 7) (24.7361, -36.5117, 7) (24.7361, -23.4063, 7) (40.1941, -23.4063, 13.5) (40.1941, -23.4063, 7)
sketch "Skizze3" plane through (48.1941, -44.5117, 3) normal (1, 0, 0) x (0, 0, -1)
  line L0 (-115.652, 173.3302) -> (33.348, 173.3302) projected
  arc A0 (-115.652, 173.3302) -> (-130.4774, 158.5048) centre (-115.652, 158.5048) ccw projected
  line L1 (-130.4774, -48.4952) -> (-130.4774, 158.5048) projected
  arc A1 (-130.4774, -48.4952) -> (-115.652, -63.3207) centre (-115.652, -48.4952) ccw projected
  line L2 (33.348, -63.3207) -> (-115.652, -63.3207) projected
  arc A2 (33.348, -63.3207) -> (48.1735, -48.4952) centre (33.348, -48.4952) ccw projected
  line L3 (48.1735, -40.6698) -> (48.1735, -48.4952) projected
  line L4 (41.848, -40.6698) -> (48.1735, -40.6698) projected
  arc A3 (26.6735, -25.4952) -> (41.848, -40.6698) centre (41.848, -25.4952) ccw projected
  line L5 (26.6735, -16.0952) -> (26.6735, -25.4952) projected
  arc A4 (41.848, -0.9207) -> (26.6735, -16.0952) centre (41.848, -16.0952) ccw projected
  line L6 (48.1735, -0.9207) -> (41.848, -0.9207) projected
  line L7 (48.1735, 158.5048) -> (48.1735, -0.9207) projected
  arc A5 (48.1735, 158.5048) -> (33.348, 173.3302) centre (33.348, 158.5048) ccw projected
  circle A6 centre (-115.652, -48.4952) radius 1.4 projected
  circle A7 centre (-120.652, 163.5048) radius 1.4 projected
  circle A8 centre (38.348, 163.5048) radius 1.4 projected
  circle A9 centre (-120.652, -53.4952) radius 1.4 projected
  circle A10 centre (38.348, -53.4952) radius 1.4 projected
  line L8 (-41.7258, 75.9615) -> (-41.7258, 34.048) projected
  line L9 (-41.7258, 34.048) -> (-71.8357, 34.048) projected
  line L10 (-71.8357, 34.048) -> (-71.8357, 75.9615) projected
  line L11 (-71.8357, 75.9615) -> (-41.7258, 75.9615) projected
  arc A11 (-20.6404, 130.8178) -> (-16.798, 130.8178) centre (-18.7192, 128.1964) ccw projected
  line L12 (-20.6404, 130.8178) -> (-91.152, 130.8178) projected
  arc A12 (-91.152, 150.8178) -> (-91.152, 130.8178) centre (-91.152, 140.8178) ccw projected
  line L13 (-91.152, 150.8178) -> (8.848, 150.8178) projected
  arc A13 (8.848, 130.8178) -> (8.848, 150.8178) centre (8.848, 140.8178) ccw projected
  line L14 (8.848, 130.8178) -> (-16.798, 130.8178) projected
  line L15 (-91.152, -21.4995) -> (8.848, -21.4995) projected
  arc A14 (8.848, -41.4995) -> (8.848, -21.4995) centre (8.848, -31.4995) ccw projected
  line L16 (8.848, -41.4995) -> (-91.152, -41.4995) projected
  arc A15 (-91.152, -21.4995) -> (-91.152, -41.4995) centre (-91.152, -31.4995) ccw projected
  circle A16 centre (-69.852, 157.3428) radius 3.25 projected
  arc A17 (-21.4197, 100.0048) -> (-16.0187, 100.0048) centre (-18.7192, 98.1964) ccw projected
  arc A18 (-16.0187, 100.0048) -> (-21.4197, 100.0048) centre (-18.7192, 101.8131) ccw projected
  arc A19 (-21.4197, 70.0048) -> (-16.0187, 70.0048) centre (-18.7192, 68.1964) ccw projected
  arc A20 (-16.0187, 70.0048) -> (-21.4197, 70.0048) centre (-18.7192, 71.8131) ccw projected
  arc A21 (-21.4197, 40.0048) -> (-16.0187, 40.0048) centre (-18.7192, 38.1964) ccw projected
  arc A22 (-16.0187, 40.0048) -> (-21.4197, 40.0048) centre (-18.7192, 41.8131) ccw projected
  arc A23 (-21.4197, 10.0048) -> (-16.0187, 10.0048) centre (-18.7192, 8.1964) ccw projected
  arc A24 (-16.0187, 10.0048) -> (-21.4197, 10.0048) centre (-18.7192, 11.8131) ccw projected
  circle A25 centre (-54.852, 157.3428) radius 3.25 projected
  circle A26 centre (-39.852, 157.3428) radius 3.25 projected
  circle A27 centre (-33.552, -2.4952) radius 3.25 projected
  circle A28 centre (-48.3, -2.4952) radius 3.25 projected
  circle A29 centre (-61.4039, -2.4952) radius 3.25 projected
  circle A30 centre (-76.152, -2.4952) radius 3.25 projected
  circle A31 centre (-18.7192, -18.1869) radius 3.25 projected
  circle A32 centre (33.348, -48.4952) radius 3.25 projected
  circle A33 centre (-39.852, -47.3333) radius 3.25 projected
  circle A34 centre (-54.852, -47.3333) radius 3.25 projected
  circle A35 centre (-69.852, -47.3333) radius 3.25 projected
  circle A36 centre (33.348, 158.5048) radius 3.25 projected
  circle A37 centre (-115.652, 158.5048) radius 3.25 projected
  circle A38 centre (-32, 113.5048) radius 3.25 projected
  circle A39 centre (-49.852, 113.5048) radius 3.25 projected
  circle A40 centre (-59.852, 113.5048) radius 3.25 projected
  circle A41 centre (-77.7039, 113.5048) radius 3.25 projected
  point P0 (3, 44.5117)
hole "Bohrung1" at (48.1941, 23.6848, 21.7192) at (48.1941, -6.3152, 21.7192) at (48.1941, -36.3152, 21.7192) direction (-1, 0, 0) diameter 2.8 depth 20
properties part number "60_Planktoscope_Electronicsholder"
